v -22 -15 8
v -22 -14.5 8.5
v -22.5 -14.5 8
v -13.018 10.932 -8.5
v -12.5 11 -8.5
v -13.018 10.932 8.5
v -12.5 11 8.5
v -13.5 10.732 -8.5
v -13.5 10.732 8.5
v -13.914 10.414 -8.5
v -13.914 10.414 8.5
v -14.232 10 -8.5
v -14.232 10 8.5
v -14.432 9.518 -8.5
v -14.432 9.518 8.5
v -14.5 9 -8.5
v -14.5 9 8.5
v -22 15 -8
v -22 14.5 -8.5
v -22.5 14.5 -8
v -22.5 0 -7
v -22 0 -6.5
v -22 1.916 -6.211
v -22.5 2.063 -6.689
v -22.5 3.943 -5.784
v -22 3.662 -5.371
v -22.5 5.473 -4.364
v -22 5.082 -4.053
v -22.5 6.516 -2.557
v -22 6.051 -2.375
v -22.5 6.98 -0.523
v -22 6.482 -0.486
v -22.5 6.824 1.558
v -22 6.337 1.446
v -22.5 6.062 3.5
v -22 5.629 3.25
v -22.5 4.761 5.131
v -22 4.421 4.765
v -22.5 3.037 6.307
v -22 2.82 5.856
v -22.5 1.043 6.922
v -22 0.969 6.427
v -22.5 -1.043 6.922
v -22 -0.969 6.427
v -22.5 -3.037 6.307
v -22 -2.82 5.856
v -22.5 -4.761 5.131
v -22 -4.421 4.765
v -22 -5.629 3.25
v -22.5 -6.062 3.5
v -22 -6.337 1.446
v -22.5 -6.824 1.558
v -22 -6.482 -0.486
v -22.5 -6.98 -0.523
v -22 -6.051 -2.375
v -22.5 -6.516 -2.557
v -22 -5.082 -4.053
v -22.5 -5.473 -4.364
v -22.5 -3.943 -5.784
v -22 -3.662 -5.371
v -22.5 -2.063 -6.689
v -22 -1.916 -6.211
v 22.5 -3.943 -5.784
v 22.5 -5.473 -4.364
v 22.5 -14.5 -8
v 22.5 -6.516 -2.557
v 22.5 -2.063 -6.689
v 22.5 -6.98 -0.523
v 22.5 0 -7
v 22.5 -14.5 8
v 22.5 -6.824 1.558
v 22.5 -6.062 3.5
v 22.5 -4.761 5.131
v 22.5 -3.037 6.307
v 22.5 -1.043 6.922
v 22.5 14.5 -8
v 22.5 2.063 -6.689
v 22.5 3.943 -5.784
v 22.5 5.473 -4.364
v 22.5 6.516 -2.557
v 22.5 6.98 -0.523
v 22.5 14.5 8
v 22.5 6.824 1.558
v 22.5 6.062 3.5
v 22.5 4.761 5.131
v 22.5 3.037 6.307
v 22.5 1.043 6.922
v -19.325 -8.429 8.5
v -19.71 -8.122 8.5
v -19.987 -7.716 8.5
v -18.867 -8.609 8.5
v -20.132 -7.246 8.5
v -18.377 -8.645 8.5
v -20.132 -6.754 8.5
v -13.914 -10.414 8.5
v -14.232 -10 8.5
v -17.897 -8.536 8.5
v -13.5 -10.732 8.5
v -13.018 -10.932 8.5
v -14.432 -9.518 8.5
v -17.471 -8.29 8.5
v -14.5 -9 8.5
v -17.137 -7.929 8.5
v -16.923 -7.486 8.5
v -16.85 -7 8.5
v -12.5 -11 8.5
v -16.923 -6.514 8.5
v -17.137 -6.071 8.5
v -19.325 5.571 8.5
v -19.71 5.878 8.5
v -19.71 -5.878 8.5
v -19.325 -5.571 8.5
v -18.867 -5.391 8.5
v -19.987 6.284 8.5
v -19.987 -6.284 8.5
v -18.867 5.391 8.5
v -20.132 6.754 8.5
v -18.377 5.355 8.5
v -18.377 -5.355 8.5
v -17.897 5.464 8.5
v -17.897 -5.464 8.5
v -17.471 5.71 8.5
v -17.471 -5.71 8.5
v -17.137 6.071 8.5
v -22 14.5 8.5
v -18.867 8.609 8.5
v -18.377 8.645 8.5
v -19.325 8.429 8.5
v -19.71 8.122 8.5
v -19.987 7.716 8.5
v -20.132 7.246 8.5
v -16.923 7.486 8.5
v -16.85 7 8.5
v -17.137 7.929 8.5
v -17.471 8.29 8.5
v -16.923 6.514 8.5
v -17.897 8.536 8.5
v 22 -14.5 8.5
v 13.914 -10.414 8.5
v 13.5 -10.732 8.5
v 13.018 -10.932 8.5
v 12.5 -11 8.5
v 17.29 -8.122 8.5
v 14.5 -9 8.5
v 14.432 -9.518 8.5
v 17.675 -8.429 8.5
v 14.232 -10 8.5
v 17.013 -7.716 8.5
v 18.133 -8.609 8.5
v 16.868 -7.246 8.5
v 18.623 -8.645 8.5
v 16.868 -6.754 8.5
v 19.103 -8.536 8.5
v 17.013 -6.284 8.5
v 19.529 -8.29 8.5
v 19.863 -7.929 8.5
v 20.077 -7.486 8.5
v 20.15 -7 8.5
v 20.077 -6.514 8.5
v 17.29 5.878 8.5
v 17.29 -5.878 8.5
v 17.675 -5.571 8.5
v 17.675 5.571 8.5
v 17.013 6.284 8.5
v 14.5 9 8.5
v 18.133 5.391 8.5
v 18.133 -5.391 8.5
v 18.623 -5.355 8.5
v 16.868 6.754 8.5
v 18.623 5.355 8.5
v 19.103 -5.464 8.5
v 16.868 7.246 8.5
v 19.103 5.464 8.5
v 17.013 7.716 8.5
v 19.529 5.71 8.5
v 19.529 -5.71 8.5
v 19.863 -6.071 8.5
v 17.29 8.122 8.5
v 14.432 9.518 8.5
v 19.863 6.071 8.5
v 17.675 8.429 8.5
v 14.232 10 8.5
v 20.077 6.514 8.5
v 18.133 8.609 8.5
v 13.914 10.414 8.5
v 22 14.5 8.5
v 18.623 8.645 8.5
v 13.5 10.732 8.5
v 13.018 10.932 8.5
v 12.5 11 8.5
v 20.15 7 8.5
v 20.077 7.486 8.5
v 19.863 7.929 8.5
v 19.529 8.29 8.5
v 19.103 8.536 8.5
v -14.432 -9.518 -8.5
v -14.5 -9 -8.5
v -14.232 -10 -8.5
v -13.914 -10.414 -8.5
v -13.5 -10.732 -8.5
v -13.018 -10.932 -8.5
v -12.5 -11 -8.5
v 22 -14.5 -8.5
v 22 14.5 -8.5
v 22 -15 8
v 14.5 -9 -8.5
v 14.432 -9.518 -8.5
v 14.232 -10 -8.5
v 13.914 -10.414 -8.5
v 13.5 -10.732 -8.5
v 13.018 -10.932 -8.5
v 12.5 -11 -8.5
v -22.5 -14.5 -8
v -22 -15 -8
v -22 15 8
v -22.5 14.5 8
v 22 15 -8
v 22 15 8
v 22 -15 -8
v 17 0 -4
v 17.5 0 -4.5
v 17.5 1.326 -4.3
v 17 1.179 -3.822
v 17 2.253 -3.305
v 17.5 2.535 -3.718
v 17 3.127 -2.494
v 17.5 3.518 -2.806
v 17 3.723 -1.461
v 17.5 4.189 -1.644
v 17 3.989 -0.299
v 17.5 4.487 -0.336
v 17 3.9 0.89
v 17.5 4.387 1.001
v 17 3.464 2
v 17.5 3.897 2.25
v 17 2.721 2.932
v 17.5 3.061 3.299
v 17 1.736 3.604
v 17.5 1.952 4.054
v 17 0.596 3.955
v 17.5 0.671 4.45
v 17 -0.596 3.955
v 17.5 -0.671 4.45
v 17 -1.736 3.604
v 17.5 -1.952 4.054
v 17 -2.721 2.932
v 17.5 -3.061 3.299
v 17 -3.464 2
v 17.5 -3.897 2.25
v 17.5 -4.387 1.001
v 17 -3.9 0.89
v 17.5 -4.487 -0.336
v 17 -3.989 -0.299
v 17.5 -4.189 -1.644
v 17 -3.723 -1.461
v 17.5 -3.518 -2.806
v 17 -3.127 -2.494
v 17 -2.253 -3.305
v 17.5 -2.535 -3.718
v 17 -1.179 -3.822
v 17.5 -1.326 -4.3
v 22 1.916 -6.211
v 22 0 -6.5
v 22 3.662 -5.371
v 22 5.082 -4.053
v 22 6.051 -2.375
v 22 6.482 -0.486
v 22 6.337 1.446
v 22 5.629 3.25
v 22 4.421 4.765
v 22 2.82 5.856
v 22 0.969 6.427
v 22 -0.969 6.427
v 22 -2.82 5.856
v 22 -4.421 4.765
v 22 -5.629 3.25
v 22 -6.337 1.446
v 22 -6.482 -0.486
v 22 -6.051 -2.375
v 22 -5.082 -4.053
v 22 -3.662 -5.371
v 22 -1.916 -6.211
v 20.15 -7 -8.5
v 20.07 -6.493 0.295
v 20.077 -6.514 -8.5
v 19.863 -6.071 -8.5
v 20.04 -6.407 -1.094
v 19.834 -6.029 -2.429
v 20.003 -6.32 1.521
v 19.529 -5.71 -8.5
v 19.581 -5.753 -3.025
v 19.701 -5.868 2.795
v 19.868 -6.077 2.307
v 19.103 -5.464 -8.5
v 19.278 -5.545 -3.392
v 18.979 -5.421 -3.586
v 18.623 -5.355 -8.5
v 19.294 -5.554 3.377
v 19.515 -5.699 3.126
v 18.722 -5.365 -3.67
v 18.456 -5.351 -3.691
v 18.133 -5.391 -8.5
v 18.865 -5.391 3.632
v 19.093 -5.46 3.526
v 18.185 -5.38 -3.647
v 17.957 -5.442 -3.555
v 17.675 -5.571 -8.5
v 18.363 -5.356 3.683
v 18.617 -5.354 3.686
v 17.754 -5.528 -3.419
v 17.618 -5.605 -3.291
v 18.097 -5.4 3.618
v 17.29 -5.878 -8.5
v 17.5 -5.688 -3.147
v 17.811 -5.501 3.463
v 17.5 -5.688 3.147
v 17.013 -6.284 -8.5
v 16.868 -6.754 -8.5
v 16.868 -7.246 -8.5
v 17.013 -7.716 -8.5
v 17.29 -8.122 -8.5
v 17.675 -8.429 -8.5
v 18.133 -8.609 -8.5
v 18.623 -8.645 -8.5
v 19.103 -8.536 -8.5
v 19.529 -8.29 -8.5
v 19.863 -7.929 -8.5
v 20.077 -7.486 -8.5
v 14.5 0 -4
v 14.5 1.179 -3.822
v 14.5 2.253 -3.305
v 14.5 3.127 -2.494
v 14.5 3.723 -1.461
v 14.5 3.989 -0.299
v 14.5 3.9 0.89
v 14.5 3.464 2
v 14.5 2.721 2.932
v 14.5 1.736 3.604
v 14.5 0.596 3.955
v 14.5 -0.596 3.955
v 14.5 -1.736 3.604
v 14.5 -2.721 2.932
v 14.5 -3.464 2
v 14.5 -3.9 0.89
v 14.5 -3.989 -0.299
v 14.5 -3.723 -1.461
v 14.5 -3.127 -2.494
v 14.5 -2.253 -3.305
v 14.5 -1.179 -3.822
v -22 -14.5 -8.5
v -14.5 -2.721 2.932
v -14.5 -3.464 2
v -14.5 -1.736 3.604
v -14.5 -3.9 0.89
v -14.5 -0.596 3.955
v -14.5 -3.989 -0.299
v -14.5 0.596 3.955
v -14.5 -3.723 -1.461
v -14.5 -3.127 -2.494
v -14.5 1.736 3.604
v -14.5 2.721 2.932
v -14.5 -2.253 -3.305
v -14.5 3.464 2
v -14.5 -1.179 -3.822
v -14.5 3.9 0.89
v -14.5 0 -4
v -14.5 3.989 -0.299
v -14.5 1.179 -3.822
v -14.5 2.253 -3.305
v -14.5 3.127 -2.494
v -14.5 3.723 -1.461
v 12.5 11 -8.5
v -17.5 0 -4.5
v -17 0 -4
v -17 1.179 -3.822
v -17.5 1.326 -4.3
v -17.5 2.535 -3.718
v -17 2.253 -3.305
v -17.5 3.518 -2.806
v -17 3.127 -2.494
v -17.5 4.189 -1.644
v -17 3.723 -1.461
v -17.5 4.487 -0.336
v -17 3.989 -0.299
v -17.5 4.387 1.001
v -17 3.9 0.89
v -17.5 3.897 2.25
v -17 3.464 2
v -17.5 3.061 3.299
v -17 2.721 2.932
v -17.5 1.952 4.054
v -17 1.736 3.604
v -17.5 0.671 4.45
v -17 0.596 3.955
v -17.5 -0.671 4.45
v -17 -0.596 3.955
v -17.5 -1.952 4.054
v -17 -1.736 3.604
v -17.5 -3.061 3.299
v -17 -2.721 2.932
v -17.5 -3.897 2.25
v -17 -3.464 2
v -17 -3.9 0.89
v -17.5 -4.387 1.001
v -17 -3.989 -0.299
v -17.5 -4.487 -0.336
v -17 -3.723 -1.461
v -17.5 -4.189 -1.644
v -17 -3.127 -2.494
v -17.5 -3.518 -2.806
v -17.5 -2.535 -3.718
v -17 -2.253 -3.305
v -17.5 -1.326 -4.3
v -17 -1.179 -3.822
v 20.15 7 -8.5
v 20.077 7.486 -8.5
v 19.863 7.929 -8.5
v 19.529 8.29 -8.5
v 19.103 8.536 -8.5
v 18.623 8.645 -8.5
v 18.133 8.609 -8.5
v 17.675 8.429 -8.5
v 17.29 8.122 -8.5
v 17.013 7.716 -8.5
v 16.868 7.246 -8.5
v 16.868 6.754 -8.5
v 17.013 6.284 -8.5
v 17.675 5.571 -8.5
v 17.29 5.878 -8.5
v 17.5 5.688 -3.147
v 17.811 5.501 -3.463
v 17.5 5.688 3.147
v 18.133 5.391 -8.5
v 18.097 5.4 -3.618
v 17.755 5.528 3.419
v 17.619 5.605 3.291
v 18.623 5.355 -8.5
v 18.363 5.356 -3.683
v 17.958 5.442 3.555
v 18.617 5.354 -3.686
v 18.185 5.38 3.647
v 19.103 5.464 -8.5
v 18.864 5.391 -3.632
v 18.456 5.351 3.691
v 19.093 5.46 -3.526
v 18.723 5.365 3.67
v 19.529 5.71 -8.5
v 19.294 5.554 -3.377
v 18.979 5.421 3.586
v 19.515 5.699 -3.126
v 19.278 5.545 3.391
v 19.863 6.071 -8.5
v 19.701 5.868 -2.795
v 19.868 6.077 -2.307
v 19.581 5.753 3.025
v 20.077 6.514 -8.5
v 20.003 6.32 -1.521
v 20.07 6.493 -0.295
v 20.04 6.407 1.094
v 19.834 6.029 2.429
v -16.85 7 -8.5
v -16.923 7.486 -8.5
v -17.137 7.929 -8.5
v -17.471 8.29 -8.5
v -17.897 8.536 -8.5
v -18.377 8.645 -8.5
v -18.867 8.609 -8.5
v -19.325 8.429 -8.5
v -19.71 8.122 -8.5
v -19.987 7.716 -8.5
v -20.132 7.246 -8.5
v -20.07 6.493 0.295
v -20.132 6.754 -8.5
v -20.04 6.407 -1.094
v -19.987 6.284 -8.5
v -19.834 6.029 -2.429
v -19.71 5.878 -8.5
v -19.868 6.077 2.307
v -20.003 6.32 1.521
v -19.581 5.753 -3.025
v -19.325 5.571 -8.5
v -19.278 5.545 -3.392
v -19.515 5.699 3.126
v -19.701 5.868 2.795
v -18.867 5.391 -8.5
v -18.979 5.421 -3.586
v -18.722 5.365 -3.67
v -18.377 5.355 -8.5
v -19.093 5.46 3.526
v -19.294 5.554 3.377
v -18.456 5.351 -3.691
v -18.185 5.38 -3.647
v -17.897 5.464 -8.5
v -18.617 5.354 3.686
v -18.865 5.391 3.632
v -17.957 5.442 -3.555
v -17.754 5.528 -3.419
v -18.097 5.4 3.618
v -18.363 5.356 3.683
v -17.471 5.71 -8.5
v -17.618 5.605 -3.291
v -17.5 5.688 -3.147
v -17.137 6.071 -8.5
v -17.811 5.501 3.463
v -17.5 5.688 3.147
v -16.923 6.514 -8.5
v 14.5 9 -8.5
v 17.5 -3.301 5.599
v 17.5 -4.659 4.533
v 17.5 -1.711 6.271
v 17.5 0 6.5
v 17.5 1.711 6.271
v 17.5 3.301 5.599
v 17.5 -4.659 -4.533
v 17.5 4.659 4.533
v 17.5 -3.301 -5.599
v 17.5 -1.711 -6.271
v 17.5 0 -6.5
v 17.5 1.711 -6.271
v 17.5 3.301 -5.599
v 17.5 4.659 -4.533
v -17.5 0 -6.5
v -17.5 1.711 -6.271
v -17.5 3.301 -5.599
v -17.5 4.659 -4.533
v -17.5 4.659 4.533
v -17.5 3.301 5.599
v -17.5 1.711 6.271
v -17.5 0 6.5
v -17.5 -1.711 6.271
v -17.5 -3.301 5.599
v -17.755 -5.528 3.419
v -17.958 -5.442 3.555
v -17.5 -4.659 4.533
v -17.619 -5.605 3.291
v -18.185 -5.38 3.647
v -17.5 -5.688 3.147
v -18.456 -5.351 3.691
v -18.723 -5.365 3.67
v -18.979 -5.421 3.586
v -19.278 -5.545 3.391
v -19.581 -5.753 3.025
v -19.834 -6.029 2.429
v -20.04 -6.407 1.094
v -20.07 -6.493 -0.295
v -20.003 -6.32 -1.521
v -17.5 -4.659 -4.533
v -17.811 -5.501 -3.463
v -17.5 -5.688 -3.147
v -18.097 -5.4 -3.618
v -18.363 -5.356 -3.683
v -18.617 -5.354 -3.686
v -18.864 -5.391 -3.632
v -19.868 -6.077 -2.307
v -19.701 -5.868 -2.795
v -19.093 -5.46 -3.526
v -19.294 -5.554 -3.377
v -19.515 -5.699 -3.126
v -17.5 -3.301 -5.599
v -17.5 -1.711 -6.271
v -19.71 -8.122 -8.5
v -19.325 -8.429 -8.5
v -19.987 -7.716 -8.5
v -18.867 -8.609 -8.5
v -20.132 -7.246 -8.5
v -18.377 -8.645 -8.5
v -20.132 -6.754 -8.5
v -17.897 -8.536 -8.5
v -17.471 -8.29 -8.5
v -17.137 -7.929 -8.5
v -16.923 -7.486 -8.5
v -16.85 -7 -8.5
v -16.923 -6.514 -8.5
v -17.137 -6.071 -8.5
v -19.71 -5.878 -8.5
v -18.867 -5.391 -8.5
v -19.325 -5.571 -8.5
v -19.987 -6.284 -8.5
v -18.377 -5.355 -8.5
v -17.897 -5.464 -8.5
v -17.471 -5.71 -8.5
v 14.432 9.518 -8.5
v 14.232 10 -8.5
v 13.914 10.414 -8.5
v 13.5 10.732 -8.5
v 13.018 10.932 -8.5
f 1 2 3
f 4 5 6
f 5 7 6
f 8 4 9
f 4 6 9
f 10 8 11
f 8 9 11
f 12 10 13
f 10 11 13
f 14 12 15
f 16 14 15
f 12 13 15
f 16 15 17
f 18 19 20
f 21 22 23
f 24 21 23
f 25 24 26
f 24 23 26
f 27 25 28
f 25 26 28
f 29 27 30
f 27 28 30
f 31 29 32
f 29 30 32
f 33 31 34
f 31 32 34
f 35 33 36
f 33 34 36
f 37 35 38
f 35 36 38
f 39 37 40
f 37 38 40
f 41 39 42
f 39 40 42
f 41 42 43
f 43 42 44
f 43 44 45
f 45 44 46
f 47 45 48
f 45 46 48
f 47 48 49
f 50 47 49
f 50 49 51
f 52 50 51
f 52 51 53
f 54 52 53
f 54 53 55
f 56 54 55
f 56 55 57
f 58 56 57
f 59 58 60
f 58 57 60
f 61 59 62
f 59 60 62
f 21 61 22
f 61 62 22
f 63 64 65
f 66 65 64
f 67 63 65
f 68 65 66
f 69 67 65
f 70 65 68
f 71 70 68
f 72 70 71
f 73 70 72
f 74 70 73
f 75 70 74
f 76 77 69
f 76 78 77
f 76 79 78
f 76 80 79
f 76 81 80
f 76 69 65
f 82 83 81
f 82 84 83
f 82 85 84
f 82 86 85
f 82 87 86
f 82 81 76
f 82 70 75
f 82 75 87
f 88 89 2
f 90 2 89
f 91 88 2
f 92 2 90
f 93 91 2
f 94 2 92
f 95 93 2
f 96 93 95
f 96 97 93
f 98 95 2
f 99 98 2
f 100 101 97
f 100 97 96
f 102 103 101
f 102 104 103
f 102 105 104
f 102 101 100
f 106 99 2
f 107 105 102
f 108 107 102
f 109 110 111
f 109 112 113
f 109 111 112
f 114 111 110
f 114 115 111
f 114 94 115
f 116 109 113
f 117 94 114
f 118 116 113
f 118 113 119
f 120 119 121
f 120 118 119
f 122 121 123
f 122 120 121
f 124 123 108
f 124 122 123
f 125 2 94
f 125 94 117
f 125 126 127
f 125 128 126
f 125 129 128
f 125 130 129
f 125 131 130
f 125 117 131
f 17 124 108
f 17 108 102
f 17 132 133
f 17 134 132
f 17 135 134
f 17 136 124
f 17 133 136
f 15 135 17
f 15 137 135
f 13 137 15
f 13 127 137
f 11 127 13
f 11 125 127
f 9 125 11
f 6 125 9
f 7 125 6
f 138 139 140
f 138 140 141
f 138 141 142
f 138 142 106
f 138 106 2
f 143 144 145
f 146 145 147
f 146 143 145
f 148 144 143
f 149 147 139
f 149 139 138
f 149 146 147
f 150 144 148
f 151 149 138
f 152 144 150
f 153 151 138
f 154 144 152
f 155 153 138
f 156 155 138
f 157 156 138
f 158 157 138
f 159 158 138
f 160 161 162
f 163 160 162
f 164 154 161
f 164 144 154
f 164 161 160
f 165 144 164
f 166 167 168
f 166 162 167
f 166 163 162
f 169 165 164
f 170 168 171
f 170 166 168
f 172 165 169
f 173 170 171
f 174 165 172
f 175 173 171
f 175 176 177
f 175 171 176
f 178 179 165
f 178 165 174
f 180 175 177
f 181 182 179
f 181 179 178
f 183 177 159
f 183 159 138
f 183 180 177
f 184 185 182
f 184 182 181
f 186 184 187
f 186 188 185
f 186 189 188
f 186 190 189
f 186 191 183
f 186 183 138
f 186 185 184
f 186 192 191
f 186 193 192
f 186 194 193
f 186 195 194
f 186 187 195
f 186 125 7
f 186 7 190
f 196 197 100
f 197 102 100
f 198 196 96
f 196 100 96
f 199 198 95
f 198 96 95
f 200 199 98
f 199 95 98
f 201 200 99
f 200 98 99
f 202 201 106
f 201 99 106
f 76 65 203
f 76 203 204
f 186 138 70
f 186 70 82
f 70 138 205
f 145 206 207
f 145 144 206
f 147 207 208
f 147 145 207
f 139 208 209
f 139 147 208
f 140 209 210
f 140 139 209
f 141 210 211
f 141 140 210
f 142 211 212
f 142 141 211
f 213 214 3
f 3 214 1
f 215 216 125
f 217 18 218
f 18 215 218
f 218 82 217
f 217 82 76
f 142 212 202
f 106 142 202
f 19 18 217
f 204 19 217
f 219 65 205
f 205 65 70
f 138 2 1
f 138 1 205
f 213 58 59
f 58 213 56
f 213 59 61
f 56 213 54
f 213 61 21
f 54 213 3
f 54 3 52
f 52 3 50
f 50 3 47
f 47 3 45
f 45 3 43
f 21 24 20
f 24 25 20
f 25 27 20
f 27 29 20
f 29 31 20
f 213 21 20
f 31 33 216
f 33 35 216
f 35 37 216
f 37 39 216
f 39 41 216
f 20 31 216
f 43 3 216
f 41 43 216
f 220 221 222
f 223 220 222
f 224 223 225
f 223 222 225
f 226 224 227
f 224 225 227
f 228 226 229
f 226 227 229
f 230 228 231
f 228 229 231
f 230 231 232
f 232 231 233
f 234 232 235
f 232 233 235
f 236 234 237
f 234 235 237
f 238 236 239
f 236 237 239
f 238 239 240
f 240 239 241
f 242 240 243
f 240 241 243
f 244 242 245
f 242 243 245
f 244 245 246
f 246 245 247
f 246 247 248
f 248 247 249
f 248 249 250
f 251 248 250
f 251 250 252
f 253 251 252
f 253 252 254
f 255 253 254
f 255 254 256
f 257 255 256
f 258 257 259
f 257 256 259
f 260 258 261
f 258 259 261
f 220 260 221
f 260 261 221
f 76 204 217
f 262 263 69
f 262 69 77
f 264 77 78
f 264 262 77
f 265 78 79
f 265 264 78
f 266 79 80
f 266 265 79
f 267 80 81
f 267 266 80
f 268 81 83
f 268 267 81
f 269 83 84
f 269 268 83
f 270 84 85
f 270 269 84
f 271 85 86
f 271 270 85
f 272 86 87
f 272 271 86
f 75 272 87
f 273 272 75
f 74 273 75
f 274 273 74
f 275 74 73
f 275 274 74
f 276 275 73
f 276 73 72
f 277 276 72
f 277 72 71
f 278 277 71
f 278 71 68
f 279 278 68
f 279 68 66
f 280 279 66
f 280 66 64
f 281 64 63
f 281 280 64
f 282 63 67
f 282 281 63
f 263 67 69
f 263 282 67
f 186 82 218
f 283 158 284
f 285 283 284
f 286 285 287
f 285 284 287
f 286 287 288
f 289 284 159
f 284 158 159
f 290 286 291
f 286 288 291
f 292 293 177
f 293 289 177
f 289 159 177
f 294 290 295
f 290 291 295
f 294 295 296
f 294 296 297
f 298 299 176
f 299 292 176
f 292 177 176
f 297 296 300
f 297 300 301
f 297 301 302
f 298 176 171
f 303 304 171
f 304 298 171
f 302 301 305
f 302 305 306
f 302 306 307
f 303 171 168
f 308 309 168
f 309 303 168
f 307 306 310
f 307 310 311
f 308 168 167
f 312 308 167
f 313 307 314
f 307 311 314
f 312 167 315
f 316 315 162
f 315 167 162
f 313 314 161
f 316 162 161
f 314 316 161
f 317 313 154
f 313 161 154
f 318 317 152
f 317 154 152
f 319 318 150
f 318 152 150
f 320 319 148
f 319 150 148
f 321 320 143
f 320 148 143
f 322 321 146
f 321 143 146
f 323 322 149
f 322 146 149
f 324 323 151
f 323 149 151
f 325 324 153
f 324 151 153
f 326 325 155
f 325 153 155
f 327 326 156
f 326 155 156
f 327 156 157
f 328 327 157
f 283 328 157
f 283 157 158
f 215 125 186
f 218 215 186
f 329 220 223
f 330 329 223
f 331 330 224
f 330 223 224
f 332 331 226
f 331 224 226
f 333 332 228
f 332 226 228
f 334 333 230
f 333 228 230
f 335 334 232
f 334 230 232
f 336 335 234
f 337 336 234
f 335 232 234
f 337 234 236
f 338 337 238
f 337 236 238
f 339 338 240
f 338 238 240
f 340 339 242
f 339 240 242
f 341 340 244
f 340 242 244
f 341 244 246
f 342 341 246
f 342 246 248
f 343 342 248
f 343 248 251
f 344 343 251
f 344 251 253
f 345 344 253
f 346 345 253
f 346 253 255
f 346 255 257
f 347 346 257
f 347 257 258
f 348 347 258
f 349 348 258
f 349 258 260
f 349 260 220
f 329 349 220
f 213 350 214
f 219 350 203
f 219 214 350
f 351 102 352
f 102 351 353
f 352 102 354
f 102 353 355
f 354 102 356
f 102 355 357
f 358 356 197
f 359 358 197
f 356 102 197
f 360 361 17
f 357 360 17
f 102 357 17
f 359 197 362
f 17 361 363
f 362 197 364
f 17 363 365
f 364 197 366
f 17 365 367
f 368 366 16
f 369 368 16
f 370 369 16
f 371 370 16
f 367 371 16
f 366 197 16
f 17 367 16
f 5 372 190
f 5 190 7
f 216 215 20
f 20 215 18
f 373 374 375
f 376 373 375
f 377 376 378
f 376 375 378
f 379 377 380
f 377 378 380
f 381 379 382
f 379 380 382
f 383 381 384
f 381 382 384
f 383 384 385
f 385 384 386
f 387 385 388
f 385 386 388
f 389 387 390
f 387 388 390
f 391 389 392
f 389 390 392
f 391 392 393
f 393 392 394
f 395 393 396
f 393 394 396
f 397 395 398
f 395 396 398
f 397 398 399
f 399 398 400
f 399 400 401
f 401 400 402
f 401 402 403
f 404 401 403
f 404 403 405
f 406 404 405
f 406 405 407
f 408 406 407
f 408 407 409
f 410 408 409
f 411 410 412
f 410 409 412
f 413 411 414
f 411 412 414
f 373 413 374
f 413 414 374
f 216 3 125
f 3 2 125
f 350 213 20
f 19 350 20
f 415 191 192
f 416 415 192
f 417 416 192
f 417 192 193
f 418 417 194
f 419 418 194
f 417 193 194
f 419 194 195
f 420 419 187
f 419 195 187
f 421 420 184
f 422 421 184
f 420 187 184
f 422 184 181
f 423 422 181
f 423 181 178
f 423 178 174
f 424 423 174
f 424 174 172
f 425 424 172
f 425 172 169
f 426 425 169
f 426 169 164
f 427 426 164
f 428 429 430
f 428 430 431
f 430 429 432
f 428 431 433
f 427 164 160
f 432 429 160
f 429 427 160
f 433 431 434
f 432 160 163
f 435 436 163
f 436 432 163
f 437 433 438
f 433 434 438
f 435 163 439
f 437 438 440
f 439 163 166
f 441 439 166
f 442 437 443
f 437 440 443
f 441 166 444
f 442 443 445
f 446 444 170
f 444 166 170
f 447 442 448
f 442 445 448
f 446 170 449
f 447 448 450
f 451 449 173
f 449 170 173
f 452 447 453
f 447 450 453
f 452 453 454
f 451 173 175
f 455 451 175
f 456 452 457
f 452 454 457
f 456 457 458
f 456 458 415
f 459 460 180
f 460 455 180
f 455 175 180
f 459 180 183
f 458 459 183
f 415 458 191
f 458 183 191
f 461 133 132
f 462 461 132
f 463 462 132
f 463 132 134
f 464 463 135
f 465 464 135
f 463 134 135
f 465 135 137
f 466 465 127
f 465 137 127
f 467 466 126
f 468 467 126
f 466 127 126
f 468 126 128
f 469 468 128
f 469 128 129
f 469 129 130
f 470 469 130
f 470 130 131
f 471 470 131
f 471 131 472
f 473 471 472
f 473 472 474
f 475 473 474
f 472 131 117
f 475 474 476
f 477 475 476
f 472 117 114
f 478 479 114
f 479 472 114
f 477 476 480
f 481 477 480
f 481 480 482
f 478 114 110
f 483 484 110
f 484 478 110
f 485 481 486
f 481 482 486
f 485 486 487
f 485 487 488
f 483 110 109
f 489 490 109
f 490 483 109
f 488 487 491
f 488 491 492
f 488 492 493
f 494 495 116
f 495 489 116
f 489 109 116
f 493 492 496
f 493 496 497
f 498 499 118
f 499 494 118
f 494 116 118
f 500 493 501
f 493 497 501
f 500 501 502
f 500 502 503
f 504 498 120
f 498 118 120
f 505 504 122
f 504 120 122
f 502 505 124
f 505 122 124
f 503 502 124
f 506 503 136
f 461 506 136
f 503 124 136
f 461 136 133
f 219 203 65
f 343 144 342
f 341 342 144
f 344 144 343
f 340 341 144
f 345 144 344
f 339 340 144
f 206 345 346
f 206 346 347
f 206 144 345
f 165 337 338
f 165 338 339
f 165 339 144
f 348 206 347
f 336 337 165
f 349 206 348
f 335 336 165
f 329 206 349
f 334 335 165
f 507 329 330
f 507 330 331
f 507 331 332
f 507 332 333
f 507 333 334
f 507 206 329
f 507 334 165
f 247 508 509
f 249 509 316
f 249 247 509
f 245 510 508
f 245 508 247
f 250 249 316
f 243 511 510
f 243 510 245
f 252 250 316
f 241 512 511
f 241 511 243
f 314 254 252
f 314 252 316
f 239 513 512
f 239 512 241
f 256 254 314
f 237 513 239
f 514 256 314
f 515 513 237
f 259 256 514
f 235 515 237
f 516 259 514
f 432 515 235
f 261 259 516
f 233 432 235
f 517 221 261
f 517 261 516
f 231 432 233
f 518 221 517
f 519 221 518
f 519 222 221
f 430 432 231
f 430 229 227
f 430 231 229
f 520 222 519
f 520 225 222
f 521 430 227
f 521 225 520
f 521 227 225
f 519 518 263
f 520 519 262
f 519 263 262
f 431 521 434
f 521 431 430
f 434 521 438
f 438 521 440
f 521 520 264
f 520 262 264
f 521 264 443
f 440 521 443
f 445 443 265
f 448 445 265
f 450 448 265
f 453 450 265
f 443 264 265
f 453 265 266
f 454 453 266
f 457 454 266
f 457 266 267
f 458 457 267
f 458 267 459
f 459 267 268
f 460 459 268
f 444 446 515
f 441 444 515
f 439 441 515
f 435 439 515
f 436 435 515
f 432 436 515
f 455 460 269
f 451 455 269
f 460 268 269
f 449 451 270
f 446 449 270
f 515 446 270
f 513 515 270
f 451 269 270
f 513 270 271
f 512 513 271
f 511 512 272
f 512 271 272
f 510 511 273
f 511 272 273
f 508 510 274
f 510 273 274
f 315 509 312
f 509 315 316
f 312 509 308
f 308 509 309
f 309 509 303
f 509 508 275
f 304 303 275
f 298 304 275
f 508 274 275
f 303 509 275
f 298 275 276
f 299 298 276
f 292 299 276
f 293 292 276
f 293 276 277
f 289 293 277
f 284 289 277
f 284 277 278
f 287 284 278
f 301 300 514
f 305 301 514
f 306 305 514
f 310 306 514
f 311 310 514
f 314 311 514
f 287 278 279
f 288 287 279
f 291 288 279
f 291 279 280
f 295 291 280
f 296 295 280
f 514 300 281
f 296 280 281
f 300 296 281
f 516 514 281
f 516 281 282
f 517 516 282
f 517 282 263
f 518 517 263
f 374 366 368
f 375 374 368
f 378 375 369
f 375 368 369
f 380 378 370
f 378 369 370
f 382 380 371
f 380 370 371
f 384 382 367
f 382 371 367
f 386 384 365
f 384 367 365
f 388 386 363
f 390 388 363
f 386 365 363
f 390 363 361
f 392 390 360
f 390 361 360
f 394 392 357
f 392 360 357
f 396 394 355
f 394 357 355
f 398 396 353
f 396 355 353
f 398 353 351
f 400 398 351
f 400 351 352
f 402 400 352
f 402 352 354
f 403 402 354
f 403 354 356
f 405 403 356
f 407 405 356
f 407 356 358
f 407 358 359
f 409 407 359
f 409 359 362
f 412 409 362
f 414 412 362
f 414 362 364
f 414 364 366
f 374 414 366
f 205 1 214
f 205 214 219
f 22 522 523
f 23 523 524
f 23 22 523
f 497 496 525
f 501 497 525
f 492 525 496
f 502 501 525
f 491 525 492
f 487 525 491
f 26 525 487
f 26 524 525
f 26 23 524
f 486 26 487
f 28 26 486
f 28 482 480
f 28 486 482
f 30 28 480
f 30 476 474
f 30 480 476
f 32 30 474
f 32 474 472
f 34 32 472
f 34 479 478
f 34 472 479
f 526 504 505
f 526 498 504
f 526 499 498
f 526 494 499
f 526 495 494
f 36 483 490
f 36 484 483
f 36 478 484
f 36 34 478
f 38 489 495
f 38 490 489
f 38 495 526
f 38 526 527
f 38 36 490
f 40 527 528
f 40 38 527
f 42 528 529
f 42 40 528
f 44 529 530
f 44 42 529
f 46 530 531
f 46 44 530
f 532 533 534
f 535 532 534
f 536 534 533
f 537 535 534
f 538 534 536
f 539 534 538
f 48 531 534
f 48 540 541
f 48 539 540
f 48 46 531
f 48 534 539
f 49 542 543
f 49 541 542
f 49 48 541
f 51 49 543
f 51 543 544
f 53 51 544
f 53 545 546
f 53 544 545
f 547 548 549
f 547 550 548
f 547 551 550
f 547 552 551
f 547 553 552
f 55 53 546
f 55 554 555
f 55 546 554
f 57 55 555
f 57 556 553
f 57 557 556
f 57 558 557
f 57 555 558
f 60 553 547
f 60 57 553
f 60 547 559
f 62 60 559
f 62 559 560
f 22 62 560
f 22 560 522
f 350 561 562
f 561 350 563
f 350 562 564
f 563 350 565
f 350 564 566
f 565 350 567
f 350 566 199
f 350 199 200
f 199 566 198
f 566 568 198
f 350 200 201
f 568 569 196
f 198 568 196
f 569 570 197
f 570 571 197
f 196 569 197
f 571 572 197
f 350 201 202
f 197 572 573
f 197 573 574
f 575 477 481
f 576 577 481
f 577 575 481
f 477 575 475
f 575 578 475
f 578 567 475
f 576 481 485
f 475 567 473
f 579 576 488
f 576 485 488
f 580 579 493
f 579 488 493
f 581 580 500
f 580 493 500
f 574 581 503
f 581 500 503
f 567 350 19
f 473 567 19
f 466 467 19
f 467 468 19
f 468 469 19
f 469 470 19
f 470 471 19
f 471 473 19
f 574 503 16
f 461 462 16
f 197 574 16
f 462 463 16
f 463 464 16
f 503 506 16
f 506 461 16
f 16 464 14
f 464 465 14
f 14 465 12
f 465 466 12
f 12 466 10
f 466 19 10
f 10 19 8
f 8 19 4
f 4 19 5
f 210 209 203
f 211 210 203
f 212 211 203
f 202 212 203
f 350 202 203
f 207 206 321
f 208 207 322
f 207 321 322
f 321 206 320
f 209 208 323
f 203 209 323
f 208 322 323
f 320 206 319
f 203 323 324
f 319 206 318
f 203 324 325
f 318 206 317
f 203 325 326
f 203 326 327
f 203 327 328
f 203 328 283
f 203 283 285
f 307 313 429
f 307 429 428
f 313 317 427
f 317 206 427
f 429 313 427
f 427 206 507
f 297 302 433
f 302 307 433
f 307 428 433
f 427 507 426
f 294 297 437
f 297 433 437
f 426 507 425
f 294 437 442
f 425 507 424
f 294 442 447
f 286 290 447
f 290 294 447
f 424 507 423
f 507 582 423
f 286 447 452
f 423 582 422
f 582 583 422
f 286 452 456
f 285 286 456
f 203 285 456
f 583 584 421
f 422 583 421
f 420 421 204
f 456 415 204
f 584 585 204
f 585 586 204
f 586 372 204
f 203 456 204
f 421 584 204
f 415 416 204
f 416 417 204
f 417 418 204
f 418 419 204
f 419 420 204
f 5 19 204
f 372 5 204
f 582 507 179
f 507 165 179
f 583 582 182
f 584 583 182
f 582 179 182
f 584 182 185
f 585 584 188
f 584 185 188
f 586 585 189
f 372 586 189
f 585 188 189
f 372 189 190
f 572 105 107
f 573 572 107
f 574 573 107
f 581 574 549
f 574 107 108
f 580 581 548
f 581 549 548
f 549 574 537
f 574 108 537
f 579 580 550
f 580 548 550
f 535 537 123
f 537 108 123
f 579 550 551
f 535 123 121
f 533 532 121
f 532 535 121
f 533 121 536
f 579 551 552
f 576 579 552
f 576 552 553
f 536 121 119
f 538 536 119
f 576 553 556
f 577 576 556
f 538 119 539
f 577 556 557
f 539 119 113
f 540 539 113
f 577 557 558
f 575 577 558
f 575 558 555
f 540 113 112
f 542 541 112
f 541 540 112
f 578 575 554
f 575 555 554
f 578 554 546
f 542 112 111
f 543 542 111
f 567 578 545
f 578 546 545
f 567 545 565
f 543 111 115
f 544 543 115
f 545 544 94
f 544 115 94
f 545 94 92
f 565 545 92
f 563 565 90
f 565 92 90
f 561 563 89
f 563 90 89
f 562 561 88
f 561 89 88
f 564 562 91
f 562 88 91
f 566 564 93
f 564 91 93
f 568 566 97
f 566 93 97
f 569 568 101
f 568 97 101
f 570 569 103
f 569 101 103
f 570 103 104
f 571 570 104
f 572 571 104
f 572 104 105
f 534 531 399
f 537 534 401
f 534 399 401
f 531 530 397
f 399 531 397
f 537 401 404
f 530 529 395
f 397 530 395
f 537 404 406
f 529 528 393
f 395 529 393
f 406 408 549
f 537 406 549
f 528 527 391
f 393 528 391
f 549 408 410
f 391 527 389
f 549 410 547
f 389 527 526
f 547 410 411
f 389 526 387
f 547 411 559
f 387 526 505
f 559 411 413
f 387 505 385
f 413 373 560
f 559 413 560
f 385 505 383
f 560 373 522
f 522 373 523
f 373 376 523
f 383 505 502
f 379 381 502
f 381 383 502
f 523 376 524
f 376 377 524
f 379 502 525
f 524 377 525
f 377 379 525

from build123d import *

# Parameters (mm, degrees)
SKETCH_1_W          = 45
SKETCH_1_H          = 30
EXTRUDE_1_DEPTH     = 8.5
SKETCH_2_R          = 6.5
CUT_EXTRUDE_1_DEPTH = 5
SKETCH_3_R          = 4
CUT_EXTRUDE_2_DEPTH = 53
CHAMFER_1_SIZE      = 0.5
HOLE_WIZARD_M4_1_D  = 3.3
SKETCH_7_W          = 29
SKETCH_7_H          = 22
CUT_EXTRUDE_3_DEPTH = 53
FILLET_1_R          = 2
CHAMFER_2_SIZE      = 0.5


with BuildPart() as part:
    # 草图1 → 凸台-拉伸1 (new body, symmetric)
    with BuildSketch(Plane.XY):
        Rectangle(SKETCH_1_W, SKETCH_1_H)
    extrude(amount=EXTRUDE_1_DEPTH, both=True)

    # 草图2 → 切除-拉伸1 (cut)
    with BuildSketch(Plane(origin=(22.5, 0, 0), x_dir=(0, 0, -1), z_dir=(1, 0, 0))):
        Circle(SKETCH_2_R)
    cut_extrude_1 = extrude(amount=-CUT_EXTRUDE_1_DEPTH, mode=Mode.SUBTRACT)

    # 镜向1: 切除-拉伸1 across plane
    add(cut_extrude_1.mirror(Plane(origin=(0, 0, 0), x_dir=(0, 0, 1), z_dir=(1, 0, 0))), mode=Mode.SUBTRACT)

    # 草图3 → 切除-拉伸2 (cut)
    with BuildSketch(Plane(origin=(17.5, 0, 0), x_dir=(0, 0, -1), z_dir=(1, 0, 0))):
        Circle(SKETCH_3_R)
    extrude(amount=-CUT_EXTRUDE_2_DEPTH, mode=Mode.SUBTRACT)

    # 倒角1
    chamfer_1_edges = [part.edges().sort_by_distance(p)[0] for p in [
        (22.5, 0, 6.5),
        (-22.5, 0, 6.5),
        (-17.5, 0, 4),
        (17.5, 0, 4),
    ]]
    chamfer(chamfer_1_edges, length=CHAMFER_1_SIZE)

    # M4 螺纹孔1 (through all)
    with Locations(Plane(origin=(0, 0, -8.5), x_dir=(-1, 0, 0), z_dir=(0, 0, -1))):
        with Locations((-18.5, 7), (18.5, 7), (-18.5, -7), (18.5, -7)):
            Hole(HOLE_WIZARD_M4_1_D / 2)

    # 草图7 → 切除-拉伸3 (cut)
    with BuildSketch(Plane(origin=(0, 0, -8.5), x_dir=(-1, 0, 0), z_dir=(0, 0, -1))):
        Rectangle(SKETCH_7_W, SKETCH_7_H)
    extrude(amount=-CUT_EXTRUDE_3_DEPTH, mode=Mode.SUBTRACT)

    # 圆角1
    fillet_1_edges = [part.edges().sort_by_distance(p)[0] for p in [
        (-14.5, -11, 0),
        (14.5, 11, 0),
        (-14.5, 11, 0),
        (14.5, -11, 0),
    ]]
    fillet(fillet_1_edges, radius=FILLET_1_R)

    # 倒角2
    chamfer_2_edges = [part.edges().sort_by_distance(p)[0] for p in [
        (-22.5, 0, 8.5),
        (0, -15, 8.5),
        (22.5, 0, 8.5),
        (0, -15, -8.5),
        (-22.5, 0, -8.5),
        (0, 15, -8.5),
        (22.5, 0, -8.5),
        (22.5, -15, 0),
        (-22.5, -15, 0),
        (-22.5, 15, 0),
        (22.5, 15, 0),
        (0, 15, 8.5),
    ]]
    chamfer(chamfer_2_edges, length=CHAMFER_2_SIZE)


solid = part.part
